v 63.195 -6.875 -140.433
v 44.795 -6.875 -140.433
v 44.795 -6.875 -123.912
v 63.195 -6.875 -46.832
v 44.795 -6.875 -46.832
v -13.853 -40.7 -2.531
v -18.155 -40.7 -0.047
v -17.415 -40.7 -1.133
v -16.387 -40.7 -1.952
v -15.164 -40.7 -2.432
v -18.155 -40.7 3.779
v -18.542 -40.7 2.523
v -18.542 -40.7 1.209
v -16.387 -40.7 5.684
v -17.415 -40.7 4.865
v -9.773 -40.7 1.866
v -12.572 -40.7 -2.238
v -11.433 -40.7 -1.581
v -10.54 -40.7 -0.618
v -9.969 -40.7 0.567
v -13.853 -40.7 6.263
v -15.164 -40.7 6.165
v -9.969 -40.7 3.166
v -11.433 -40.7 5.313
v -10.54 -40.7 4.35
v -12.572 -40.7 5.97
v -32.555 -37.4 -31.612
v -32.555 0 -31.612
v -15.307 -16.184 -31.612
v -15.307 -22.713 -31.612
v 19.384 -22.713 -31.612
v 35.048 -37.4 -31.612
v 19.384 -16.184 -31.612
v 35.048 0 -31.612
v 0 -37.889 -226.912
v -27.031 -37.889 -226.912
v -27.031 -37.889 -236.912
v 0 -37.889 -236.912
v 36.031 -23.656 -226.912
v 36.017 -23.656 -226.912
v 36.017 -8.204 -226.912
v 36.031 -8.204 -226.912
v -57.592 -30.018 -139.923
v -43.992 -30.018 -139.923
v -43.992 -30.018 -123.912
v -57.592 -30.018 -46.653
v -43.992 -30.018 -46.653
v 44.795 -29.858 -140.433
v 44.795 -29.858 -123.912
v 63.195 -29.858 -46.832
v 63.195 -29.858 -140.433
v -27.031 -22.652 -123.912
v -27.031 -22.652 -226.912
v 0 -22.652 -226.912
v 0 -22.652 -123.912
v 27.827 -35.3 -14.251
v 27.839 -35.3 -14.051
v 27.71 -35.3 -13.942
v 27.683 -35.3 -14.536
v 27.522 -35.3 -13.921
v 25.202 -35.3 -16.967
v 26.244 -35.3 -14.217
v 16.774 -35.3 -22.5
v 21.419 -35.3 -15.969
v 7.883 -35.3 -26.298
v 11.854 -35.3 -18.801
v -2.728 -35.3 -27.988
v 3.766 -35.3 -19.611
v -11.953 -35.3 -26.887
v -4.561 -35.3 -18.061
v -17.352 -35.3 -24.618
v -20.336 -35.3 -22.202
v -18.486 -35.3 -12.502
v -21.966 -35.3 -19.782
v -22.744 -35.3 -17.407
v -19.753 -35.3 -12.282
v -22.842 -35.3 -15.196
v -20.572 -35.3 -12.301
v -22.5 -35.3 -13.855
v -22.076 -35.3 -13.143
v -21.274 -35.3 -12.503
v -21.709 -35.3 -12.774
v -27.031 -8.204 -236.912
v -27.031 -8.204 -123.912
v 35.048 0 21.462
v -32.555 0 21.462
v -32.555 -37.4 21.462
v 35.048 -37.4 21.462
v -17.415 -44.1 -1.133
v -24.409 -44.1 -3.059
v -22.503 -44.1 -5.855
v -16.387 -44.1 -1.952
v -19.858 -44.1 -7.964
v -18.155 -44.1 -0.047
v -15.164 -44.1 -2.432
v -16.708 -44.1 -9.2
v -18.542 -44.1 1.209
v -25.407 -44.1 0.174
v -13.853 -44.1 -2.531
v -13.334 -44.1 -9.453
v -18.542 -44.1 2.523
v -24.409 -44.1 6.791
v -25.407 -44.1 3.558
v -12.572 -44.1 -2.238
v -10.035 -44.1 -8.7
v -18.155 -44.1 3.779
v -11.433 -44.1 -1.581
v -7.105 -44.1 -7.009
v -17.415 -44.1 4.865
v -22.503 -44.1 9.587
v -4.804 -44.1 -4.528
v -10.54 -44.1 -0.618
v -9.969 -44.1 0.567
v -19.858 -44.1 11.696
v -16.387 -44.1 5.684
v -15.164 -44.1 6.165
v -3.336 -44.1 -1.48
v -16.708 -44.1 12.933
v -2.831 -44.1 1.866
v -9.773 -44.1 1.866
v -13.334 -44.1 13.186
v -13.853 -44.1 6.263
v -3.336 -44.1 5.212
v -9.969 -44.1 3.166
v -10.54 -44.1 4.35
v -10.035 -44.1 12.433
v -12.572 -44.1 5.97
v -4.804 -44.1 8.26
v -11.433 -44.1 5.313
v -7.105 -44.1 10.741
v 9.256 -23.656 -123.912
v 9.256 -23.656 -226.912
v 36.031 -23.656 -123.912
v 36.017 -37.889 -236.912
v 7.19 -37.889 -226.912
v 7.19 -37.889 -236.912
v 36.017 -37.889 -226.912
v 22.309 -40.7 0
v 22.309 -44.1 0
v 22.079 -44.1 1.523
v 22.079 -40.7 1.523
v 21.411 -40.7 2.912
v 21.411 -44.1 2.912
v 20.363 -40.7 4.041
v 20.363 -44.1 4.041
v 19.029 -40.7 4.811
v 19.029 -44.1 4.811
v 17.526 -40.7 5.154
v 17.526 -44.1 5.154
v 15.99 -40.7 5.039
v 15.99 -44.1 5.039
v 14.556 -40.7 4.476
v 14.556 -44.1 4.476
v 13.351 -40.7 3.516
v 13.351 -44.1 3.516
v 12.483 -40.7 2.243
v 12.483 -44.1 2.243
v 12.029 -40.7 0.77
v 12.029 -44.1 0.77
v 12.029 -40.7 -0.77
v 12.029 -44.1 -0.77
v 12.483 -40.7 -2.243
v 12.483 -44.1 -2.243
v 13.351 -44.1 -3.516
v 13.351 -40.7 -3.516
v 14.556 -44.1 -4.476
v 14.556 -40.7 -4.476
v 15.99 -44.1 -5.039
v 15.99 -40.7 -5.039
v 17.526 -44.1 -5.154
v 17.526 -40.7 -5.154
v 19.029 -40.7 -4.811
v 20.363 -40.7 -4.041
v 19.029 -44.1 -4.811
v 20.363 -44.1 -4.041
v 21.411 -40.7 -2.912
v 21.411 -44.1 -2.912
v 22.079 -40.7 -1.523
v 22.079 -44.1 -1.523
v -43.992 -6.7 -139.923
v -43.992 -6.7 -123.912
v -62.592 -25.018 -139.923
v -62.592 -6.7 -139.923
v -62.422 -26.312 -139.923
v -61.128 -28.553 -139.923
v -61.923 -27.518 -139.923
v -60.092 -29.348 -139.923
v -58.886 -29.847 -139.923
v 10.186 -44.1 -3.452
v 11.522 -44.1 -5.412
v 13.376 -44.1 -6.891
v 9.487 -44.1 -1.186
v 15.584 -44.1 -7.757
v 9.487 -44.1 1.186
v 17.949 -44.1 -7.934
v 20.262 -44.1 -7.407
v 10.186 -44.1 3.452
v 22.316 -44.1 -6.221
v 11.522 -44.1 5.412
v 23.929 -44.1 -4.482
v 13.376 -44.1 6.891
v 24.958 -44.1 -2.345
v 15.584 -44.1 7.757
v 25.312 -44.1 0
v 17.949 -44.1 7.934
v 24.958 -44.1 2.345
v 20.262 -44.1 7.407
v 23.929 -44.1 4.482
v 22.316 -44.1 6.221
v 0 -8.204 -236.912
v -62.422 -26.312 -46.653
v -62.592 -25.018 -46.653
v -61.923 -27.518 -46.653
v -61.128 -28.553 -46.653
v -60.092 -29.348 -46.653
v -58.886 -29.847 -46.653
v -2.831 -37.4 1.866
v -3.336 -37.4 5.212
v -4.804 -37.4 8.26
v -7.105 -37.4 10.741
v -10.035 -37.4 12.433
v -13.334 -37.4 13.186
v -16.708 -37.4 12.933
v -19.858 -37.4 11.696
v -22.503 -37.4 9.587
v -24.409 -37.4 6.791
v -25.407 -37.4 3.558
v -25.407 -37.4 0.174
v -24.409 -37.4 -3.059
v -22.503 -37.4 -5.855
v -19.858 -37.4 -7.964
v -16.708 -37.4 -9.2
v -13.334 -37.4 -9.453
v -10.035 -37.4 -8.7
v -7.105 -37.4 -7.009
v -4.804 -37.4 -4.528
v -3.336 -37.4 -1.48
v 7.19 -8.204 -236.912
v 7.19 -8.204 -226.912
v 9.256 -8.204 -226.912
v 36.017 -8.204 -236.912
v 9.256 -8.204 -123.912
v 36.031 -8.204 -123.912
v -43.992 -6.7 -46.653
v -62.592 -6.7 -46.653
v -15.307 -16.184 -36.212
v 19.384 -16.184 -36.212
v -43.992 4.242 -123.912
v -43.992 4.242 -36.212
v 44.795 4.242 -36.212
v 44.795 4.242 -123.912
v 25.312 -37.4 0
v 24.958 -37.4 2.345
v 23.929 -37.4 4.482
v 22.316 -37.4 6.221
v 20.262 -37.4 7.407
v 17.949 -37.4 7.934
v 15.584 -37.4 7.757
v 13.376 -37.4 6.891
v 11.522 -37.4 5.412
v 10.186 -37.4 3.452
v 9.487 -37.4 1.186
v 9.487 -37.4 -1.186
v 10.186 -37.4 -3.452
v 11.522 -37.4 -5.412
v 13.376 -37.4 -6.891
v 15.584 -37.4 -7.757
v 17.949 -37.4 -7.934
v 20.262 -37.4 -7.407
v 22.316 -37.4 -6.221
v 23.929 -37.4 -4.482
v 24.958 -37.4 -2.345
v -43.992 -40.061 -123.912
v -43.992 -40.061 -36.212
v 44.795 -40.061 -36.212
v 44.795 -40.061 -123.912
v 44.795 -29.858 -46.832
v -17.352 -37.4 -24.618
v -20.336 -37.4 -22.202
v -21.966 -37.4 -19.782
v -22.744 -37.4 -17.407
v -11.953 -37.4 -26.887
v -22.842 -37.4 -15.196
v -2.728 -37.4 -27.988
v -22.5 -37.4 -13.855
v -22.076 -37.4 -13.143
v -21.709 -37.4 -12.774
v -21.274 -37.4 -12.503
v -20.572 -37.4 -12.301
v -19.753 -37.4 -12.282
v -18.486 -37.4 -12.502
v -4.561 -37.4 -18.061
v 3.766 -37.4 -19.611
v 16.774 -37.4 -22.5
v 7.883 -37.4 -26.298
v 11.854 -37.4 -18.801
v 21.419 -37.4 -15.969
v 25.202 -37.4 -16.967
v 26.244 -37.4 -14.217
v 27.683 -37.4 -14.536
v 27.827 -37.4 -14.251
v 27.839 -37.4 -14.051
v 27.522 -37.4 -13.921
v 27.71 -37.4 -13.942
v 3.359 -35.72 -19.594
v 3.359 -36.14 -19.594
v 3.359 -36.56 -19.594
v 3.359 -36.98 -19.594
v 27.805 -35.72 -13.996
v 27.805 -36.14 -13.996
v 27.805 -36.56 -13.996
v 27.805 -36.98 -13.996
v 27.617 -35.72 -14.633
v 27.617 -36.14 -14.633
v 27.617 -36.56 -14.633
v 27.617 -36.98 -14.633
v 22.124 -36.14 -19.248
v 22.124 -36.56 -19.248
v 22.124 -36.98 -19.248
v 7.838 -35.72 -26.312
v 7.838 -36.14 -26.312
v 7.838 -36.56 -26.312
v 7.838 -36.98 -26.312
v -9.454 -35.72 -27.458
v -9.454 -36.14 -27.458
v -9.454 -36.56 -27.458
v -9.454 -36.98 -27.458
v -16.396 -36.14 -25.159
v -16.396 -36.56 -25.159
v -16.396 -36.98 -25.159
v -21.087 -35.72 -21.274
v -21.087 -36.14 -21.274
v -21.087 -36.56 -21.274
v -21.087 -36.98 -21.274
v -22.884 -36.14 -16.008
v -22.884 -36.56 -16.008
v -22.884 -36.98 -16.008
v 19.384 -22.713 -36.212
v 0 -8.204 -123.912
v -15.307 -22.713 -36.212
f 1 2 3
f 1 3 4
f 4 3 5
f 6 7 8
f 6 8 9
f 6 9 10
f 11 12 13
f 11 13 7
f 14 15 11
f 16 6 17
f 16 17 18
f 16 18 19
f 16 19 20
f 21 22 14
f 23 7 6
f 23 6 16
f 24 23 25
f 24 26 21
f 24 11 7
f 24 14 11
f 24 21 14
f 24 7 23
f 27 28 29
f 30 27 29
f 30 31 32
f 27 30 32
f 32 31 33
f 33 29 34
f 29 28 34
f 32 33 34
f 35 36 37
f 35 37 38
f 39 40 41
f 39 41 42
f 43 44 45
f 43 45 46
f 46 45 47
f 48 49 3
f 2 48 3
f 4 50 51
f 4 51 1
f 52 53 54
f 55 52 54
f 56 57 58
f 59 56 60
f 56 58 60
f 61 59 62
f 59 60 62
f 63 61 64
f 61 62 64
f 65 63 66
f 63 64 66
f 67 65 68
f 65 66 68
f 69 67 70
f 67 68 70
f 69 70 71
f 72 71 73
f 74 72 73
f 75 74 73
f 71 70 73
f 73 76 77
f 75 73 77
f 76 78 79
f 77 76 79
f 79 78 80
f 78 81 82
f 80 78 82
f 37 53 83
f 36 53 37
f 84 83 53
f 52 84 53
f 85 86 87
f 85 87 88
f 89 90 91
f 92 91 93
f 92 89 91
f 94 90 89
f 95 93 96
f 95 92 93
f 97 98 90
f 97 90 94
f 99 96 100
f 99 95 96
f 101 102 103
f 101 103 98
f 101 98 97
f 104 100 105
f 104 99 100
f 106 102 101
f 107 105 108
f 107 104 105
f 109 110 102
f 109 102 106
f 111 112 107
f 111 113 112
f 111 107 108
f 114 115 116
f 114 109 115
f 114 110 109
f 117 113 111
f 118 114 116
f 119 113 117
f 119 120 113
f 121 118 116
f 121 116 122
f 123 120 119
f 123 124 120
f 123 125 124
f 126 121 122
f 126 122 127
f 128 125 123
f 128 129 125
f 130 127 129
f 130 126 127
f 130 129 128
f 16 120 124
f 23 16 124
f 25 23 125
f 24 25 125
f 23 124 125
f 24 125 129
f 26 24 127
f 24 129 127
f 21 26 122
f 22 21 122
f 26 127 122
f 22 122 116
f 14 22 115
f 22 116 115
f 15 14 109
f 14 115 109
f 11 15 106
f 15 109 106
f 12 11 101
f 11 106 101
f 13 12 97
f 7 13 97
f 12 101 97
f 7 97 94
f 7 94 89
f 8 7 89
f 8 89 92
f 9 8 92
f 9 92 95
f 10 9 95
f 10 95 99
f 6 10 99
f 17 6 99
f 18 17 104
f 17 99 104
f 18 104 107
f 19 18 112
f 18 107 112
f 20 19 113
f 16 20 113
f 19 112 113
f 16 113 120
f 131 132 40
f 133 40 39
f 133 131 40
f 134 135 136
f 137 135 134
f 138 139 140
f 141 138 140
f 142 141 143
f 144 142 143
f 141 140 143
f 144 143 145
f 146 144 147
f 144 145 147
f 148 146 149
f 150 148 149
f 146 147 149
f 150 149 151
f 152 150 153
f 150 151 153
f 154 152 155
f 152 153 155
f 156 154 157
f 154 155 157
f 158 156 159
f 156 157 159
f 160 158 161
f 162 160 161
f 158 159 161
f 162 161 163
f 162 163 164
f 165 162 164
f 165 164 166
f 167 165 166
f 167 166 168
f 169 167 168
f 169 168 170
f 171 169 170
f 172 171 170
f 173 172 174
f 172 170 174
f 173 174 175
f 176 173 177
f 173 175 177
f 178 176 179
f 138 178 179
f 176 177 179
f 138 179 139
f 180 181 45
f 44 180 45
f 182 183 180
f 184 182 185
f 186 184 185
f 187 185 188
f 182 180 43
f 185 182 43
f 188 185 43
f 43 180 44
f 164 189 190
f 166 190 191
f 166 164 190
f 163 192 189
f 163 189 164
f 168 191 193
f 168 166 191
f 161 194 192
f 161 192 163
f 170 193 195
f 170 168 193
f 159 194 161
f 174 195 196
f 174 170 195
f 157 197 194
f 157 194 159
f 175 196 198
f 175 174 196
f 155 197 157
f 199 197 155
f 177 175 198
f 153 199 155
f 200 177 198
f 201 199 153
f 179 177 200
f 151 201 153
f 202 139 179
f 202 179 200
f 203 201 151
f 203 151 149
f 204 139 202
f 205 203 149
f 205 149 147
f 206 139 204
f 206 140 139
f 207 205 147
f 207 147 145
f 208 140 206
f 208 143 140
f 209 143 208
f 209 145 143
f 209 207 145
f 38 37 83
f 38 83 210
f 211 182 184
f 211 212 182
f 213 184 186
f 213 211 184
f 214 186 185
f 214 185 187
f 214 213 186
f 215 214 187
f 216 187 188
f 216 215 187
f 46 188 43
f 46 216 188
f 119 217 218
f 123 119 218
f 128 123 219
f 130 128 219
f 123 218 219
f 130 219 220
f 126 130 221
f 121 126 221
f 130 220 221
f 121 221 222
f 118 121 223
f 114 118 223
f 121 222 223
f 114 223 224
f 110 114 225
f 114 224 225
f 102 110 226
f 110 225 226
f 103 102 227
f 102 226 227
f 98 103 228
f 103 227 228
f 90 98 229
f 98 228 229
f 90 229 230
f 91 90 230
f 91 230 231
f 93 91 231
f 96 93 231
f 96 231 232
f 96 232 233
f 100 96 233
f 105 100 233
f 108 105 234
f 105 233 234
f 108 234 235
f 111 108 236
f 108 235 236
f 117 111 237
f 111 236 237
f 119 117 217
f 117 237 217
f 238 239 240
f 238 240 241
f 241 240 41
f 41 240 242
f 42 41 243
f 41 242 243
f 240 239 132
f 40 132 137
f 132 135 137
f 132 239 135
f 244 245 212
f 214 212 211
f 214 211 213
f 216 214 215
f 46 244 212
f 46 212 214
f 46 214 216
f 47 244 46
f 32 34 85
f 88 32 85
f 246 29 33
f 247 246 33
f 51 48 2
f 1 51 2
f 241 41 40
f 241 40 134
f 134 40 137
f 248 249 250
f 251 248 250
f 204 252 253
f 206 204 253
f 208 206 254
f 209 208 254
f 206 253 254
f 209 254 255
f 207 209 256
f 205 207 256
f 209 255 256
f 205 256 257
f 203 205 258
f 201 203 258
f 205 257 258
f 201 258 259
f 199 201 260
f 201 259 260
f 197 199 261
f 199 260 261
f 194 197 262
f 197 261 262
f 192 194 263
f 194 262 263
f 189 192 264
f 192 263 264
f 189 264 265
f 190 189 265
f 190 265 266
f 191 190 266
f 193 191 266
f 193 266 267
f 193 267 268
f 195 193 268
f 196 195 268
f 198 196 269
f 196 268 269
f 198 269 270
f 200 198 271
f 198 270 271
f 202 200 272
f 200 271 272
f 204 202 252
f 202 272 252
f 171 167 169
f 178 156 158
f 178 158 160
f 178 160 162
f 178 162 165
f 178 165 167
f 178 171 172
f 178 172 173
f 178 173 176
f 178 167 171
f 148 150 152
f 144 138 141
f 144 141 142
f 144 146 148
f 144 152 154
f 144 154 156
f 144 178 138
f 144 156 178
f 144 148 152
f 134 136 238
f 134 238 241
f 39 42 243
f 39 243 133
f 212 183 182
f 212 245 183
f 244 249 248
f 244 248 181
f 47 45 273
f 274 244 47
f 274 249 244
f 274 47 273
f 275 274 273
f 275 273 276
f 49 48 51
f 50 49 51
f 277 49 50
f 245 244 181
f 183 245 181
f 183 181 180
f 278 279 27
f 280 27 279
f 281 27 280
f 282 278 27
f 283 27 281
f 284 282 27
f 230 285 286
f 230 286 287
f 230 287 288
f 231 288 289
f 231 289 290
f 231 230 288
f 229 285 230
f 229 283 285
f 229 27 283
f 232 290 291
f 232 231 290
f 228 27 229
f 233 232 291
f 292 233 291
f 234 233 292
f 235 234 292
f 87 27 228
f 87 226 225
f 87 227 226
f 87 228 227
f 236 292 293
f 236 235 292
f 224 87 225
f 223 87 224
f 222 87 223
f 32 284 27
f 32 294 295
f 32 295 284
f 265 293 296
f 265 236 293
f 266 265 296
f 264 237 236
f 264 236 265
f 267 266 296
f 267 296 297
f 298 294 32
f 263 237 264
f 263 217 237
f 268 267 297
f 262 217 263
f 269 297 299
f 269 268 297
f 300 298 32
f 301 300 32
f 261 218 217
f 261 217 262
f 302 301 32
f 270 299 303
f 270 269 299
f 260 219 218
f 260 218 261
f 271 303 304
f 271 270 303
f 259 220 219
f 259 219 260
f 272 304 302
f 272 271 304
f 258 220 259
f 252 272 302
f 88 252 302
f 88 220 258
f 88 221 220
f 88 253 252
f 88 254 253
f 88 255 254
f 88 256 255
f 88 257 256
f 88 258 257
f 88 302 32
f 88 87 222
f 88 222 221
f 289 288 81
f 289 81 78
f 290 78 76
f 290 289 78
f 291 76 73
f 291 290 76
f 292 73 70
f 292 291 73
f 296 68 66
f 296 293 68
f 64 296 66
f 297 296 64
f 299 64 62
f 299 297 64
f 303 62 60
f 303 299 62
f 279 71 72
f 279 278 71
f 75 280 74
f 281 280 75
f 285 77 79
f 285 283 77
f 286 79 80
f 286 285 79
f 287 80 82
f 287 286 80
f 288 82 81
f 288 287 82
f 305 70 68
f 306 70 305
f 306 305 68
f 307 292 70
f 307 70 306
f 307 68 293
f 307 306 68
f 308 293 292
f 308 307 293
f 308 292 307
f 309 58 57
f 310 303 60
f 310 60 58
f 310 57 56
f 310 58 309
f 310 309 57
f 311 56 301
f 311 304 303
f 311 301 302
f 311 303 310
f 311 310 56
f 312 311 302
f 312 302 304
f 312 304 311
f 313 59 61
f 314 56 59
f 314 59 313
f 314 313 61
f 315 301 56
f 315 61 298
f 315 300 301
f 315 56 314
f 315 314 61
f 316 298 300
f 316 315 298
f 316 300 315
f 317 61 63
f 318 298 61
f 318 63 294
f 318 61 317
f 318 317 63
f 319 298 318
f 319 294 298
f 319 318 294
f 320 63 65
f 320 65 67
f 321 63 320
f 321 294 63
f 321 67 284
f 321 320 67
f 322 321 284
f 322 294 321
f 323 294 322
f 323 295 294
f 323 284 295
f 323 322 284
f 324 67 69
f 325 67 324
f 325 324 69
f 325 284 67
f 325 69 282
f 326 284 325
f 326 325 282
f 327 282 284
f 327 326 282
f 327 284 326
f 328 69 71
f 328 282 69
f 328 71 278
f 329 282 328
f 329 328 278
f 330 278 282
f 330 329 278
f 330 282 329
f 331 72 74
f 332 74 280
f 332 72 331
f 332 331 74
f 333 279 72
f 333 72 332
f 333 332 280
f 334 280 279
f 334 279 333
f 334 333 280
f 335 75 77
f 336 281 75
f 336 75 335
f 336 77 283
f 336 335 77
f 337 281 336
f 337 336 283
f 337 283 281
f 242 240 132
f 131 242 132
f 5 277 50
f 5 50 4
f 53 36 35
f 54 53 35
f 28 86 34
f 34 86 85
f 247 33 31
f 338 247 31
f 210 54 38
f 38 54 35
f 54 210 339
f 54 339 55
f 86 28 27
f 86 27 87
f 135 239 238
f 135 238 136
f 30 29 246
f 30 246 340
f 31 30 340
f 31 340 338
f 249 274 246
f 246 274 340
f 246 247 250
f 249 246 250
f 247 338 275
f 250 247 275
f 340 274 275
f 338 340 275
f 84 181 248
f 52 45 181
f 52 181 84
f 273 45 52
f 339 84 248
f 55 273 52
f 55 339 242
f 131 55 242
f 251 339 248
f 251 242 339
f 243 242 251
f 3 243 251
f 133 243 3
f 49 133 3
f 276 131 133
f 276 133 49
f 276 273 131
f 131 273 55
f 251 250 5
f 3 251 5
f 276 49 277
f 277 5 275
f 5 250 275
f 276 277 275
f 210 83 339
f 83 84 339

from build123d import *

# Parameters (mm, degrees)
F0_W      = 67.6028169692
F0_H      = 53.0741475523
F1_DEPTH  = 37.4
F2_R      = 11.3511276649
F2_R_2    = 7.9567380282
F3_DEPTH  = 6.7
F4_R      = 4.4090907082
F4_R_2    = 5.1686616875
F5_DEPTH  = 3.4
F7_DEPTH  = 2.1
F8_W      = 34.6914194524
F8_H      = 6.529385224
F9_DEPTH  = 4.6
F10_W     = 88.7872502208
F10_H     = 44.3032570183
F11_DEPTH = 87.7
F12_W     = 22.9829689488
F12_H     = 93.6014018953
F13_DEPTH = 18.4
F14_W     = 23.3173291199
F14_H     = 77.2590063095
F14_H_2   = 16.0102971315
F15_DEPTH = 18.6
F16_W     = 27.0305555314
F16_H     = 14.4476275891
F16_W_2   = 26.7750890926
F16_H_2   = 15.4520794749
F17_DEPTH = 103
F18_W     = 27.0305555314
F18_H     = 29.6849496663
F18_W_2   = 28.8268793374
F19_DEPTH = 10
F20_R     = 5


with BuildPart() as f1:
    # F0 (on Front) → F1 (new body)
    with BuildSketch(Plane.XZ):
        with Locations((1.2461747974, -5.0753373653)):
            Rectangle(F0_W, F0_H)
    extrude(amount=F1_DEPTH)

    # F2 (on face) → F3 (join)
    with BuildSketch(Plane.XZ.offset(37.4)):
        with Locations((-14.182465151, 1.8661138602)):
            Circle(F2_R)
        with Locations((17.3548590392, 0)):
            Circle(F2_R_2)
    extrude(amount=F3_DEPTH)

    # F4 (on face) → F5 (cut)
    with BuildSketch(Plane.XZ.offset(44.1)):
        with Locations((-14.182465151, 1.8661138602)):
            Circle(F4_R)
        with Locations((17.1402301639, 0)):
            Circle(F4_R_2)
    extrude(amount=-F5_DEPTH, mode=Mode.SUBTRACT)

    # F6 (on face) → F7 (cut)
    with BuildSketch(Plane.XZ.offset(37.4)):
        with BuildLine():
            add(Edge.make_bspline(
                [(-21.2736967951, -12.5029627234), (-17.6056978222, -10.7879533319), (1.7937398343, -27.2198277591), (39.0741519283, -6.345360962), (7.1844121531, -32.2427894232), (-23.5988764514, -26.0051011351), (-23.4195291506, -13.5062679776), (-21.2736967951, -12.5029627234)],
                knots=[0, 0, 0, 0, 0.217341047, 0.4323199028, 0.6402459683, 0.8728523496, 1, 1, 1, 1], degree=3))
        make_face()
    extrude(amount=-F7_DEPTH, mode=Mode.SUBTRACT)

    # F8 (on face) → F9 (join)
    with BuildSketch(Plane(origin=(0, 0, -31.6124111414), x_dir=(1, 0, 0), z_dir=(0, 0, -1))):
        with Locations((2.0386911929, 19.4482291117)):
            Rectangle(F8_W, F8_H)
    extrude(amount=F9_DEPTH)

    # F10 (on face) → F11 (join)
    with BuildSketch(Plane(origin=(0, 0, -36.2124111414), x_dir=(1, 0, 0), z_dir=(0, 0, -1))):
        with Locations((0.4012212157, 17.9098602384)):
            Rectangle(F10_W, F10_H)
    extrude(amount=F11_DEPTH)

    # F12 (on face) → F13 (join)
    with BuildSketch(Plane.YZ.offset(44.7948463261)):
        with Locations((-18.3663782664, -93.6325211078)):
            Rectangle(F12_W, F12_H)
    extrude(amount=F13_DEPTH)

    # F14 (on face) → F15 (join)
    with BuildSketch(Plane(origin=(-43.9924038947, 0, 0), x_dir=(0, -1, 0), z_dir=(-1, 0, 0))):
        with Locations((18.3590447996, -85.2829079866)):
            Rectangle(F14_W, F14_H)
        with Locations((18.3590447996, -131.9175597072)):
            Rectangle(F14_W, F14_H_2)
    extrude(amount=F15_DEPTH)

    # F16 (on face) → F17 (join)
    with BuildSketch(Plane(origin=(0, 0, -123.9124111414), x_dir=(1, 0, 0), z_dir=(0, 0, -1))):
        with Locations((-13.5152777657, 15.4278827831)):
            Rectangle(F16_W, F16_H)
        with Locations((22.6432844065, 15.930108726)):
            Rectangle(F16_W_2, F16_H_2)
    extrude(amount=F17_DEPTH)

    # F18 (on face) → F19 (join)
    with BuildSketch(Plane(origin=(0, 0, -226.9124111414), x_dir=(1, 0, 0), z_dir=(0, 0, -1))):
        with Locations((-13.5152777657, 23.0465438217)):
            Rectangle(F18_W, F18_H)
        with Locations((21.6039149091, 23.0465438217)):
            Rectangle(F18_W_2, F18_H)
    extrude(amount=F19_DEPTH)

    # F20
    f20_edges = [f1.edges().sort_by_distance(p)[0] for p in [
        (-62.592404, -30.017709, -93.288057),
    ]]
    fillet(f20_edges, radius=F20_R)


solid = f1.part
